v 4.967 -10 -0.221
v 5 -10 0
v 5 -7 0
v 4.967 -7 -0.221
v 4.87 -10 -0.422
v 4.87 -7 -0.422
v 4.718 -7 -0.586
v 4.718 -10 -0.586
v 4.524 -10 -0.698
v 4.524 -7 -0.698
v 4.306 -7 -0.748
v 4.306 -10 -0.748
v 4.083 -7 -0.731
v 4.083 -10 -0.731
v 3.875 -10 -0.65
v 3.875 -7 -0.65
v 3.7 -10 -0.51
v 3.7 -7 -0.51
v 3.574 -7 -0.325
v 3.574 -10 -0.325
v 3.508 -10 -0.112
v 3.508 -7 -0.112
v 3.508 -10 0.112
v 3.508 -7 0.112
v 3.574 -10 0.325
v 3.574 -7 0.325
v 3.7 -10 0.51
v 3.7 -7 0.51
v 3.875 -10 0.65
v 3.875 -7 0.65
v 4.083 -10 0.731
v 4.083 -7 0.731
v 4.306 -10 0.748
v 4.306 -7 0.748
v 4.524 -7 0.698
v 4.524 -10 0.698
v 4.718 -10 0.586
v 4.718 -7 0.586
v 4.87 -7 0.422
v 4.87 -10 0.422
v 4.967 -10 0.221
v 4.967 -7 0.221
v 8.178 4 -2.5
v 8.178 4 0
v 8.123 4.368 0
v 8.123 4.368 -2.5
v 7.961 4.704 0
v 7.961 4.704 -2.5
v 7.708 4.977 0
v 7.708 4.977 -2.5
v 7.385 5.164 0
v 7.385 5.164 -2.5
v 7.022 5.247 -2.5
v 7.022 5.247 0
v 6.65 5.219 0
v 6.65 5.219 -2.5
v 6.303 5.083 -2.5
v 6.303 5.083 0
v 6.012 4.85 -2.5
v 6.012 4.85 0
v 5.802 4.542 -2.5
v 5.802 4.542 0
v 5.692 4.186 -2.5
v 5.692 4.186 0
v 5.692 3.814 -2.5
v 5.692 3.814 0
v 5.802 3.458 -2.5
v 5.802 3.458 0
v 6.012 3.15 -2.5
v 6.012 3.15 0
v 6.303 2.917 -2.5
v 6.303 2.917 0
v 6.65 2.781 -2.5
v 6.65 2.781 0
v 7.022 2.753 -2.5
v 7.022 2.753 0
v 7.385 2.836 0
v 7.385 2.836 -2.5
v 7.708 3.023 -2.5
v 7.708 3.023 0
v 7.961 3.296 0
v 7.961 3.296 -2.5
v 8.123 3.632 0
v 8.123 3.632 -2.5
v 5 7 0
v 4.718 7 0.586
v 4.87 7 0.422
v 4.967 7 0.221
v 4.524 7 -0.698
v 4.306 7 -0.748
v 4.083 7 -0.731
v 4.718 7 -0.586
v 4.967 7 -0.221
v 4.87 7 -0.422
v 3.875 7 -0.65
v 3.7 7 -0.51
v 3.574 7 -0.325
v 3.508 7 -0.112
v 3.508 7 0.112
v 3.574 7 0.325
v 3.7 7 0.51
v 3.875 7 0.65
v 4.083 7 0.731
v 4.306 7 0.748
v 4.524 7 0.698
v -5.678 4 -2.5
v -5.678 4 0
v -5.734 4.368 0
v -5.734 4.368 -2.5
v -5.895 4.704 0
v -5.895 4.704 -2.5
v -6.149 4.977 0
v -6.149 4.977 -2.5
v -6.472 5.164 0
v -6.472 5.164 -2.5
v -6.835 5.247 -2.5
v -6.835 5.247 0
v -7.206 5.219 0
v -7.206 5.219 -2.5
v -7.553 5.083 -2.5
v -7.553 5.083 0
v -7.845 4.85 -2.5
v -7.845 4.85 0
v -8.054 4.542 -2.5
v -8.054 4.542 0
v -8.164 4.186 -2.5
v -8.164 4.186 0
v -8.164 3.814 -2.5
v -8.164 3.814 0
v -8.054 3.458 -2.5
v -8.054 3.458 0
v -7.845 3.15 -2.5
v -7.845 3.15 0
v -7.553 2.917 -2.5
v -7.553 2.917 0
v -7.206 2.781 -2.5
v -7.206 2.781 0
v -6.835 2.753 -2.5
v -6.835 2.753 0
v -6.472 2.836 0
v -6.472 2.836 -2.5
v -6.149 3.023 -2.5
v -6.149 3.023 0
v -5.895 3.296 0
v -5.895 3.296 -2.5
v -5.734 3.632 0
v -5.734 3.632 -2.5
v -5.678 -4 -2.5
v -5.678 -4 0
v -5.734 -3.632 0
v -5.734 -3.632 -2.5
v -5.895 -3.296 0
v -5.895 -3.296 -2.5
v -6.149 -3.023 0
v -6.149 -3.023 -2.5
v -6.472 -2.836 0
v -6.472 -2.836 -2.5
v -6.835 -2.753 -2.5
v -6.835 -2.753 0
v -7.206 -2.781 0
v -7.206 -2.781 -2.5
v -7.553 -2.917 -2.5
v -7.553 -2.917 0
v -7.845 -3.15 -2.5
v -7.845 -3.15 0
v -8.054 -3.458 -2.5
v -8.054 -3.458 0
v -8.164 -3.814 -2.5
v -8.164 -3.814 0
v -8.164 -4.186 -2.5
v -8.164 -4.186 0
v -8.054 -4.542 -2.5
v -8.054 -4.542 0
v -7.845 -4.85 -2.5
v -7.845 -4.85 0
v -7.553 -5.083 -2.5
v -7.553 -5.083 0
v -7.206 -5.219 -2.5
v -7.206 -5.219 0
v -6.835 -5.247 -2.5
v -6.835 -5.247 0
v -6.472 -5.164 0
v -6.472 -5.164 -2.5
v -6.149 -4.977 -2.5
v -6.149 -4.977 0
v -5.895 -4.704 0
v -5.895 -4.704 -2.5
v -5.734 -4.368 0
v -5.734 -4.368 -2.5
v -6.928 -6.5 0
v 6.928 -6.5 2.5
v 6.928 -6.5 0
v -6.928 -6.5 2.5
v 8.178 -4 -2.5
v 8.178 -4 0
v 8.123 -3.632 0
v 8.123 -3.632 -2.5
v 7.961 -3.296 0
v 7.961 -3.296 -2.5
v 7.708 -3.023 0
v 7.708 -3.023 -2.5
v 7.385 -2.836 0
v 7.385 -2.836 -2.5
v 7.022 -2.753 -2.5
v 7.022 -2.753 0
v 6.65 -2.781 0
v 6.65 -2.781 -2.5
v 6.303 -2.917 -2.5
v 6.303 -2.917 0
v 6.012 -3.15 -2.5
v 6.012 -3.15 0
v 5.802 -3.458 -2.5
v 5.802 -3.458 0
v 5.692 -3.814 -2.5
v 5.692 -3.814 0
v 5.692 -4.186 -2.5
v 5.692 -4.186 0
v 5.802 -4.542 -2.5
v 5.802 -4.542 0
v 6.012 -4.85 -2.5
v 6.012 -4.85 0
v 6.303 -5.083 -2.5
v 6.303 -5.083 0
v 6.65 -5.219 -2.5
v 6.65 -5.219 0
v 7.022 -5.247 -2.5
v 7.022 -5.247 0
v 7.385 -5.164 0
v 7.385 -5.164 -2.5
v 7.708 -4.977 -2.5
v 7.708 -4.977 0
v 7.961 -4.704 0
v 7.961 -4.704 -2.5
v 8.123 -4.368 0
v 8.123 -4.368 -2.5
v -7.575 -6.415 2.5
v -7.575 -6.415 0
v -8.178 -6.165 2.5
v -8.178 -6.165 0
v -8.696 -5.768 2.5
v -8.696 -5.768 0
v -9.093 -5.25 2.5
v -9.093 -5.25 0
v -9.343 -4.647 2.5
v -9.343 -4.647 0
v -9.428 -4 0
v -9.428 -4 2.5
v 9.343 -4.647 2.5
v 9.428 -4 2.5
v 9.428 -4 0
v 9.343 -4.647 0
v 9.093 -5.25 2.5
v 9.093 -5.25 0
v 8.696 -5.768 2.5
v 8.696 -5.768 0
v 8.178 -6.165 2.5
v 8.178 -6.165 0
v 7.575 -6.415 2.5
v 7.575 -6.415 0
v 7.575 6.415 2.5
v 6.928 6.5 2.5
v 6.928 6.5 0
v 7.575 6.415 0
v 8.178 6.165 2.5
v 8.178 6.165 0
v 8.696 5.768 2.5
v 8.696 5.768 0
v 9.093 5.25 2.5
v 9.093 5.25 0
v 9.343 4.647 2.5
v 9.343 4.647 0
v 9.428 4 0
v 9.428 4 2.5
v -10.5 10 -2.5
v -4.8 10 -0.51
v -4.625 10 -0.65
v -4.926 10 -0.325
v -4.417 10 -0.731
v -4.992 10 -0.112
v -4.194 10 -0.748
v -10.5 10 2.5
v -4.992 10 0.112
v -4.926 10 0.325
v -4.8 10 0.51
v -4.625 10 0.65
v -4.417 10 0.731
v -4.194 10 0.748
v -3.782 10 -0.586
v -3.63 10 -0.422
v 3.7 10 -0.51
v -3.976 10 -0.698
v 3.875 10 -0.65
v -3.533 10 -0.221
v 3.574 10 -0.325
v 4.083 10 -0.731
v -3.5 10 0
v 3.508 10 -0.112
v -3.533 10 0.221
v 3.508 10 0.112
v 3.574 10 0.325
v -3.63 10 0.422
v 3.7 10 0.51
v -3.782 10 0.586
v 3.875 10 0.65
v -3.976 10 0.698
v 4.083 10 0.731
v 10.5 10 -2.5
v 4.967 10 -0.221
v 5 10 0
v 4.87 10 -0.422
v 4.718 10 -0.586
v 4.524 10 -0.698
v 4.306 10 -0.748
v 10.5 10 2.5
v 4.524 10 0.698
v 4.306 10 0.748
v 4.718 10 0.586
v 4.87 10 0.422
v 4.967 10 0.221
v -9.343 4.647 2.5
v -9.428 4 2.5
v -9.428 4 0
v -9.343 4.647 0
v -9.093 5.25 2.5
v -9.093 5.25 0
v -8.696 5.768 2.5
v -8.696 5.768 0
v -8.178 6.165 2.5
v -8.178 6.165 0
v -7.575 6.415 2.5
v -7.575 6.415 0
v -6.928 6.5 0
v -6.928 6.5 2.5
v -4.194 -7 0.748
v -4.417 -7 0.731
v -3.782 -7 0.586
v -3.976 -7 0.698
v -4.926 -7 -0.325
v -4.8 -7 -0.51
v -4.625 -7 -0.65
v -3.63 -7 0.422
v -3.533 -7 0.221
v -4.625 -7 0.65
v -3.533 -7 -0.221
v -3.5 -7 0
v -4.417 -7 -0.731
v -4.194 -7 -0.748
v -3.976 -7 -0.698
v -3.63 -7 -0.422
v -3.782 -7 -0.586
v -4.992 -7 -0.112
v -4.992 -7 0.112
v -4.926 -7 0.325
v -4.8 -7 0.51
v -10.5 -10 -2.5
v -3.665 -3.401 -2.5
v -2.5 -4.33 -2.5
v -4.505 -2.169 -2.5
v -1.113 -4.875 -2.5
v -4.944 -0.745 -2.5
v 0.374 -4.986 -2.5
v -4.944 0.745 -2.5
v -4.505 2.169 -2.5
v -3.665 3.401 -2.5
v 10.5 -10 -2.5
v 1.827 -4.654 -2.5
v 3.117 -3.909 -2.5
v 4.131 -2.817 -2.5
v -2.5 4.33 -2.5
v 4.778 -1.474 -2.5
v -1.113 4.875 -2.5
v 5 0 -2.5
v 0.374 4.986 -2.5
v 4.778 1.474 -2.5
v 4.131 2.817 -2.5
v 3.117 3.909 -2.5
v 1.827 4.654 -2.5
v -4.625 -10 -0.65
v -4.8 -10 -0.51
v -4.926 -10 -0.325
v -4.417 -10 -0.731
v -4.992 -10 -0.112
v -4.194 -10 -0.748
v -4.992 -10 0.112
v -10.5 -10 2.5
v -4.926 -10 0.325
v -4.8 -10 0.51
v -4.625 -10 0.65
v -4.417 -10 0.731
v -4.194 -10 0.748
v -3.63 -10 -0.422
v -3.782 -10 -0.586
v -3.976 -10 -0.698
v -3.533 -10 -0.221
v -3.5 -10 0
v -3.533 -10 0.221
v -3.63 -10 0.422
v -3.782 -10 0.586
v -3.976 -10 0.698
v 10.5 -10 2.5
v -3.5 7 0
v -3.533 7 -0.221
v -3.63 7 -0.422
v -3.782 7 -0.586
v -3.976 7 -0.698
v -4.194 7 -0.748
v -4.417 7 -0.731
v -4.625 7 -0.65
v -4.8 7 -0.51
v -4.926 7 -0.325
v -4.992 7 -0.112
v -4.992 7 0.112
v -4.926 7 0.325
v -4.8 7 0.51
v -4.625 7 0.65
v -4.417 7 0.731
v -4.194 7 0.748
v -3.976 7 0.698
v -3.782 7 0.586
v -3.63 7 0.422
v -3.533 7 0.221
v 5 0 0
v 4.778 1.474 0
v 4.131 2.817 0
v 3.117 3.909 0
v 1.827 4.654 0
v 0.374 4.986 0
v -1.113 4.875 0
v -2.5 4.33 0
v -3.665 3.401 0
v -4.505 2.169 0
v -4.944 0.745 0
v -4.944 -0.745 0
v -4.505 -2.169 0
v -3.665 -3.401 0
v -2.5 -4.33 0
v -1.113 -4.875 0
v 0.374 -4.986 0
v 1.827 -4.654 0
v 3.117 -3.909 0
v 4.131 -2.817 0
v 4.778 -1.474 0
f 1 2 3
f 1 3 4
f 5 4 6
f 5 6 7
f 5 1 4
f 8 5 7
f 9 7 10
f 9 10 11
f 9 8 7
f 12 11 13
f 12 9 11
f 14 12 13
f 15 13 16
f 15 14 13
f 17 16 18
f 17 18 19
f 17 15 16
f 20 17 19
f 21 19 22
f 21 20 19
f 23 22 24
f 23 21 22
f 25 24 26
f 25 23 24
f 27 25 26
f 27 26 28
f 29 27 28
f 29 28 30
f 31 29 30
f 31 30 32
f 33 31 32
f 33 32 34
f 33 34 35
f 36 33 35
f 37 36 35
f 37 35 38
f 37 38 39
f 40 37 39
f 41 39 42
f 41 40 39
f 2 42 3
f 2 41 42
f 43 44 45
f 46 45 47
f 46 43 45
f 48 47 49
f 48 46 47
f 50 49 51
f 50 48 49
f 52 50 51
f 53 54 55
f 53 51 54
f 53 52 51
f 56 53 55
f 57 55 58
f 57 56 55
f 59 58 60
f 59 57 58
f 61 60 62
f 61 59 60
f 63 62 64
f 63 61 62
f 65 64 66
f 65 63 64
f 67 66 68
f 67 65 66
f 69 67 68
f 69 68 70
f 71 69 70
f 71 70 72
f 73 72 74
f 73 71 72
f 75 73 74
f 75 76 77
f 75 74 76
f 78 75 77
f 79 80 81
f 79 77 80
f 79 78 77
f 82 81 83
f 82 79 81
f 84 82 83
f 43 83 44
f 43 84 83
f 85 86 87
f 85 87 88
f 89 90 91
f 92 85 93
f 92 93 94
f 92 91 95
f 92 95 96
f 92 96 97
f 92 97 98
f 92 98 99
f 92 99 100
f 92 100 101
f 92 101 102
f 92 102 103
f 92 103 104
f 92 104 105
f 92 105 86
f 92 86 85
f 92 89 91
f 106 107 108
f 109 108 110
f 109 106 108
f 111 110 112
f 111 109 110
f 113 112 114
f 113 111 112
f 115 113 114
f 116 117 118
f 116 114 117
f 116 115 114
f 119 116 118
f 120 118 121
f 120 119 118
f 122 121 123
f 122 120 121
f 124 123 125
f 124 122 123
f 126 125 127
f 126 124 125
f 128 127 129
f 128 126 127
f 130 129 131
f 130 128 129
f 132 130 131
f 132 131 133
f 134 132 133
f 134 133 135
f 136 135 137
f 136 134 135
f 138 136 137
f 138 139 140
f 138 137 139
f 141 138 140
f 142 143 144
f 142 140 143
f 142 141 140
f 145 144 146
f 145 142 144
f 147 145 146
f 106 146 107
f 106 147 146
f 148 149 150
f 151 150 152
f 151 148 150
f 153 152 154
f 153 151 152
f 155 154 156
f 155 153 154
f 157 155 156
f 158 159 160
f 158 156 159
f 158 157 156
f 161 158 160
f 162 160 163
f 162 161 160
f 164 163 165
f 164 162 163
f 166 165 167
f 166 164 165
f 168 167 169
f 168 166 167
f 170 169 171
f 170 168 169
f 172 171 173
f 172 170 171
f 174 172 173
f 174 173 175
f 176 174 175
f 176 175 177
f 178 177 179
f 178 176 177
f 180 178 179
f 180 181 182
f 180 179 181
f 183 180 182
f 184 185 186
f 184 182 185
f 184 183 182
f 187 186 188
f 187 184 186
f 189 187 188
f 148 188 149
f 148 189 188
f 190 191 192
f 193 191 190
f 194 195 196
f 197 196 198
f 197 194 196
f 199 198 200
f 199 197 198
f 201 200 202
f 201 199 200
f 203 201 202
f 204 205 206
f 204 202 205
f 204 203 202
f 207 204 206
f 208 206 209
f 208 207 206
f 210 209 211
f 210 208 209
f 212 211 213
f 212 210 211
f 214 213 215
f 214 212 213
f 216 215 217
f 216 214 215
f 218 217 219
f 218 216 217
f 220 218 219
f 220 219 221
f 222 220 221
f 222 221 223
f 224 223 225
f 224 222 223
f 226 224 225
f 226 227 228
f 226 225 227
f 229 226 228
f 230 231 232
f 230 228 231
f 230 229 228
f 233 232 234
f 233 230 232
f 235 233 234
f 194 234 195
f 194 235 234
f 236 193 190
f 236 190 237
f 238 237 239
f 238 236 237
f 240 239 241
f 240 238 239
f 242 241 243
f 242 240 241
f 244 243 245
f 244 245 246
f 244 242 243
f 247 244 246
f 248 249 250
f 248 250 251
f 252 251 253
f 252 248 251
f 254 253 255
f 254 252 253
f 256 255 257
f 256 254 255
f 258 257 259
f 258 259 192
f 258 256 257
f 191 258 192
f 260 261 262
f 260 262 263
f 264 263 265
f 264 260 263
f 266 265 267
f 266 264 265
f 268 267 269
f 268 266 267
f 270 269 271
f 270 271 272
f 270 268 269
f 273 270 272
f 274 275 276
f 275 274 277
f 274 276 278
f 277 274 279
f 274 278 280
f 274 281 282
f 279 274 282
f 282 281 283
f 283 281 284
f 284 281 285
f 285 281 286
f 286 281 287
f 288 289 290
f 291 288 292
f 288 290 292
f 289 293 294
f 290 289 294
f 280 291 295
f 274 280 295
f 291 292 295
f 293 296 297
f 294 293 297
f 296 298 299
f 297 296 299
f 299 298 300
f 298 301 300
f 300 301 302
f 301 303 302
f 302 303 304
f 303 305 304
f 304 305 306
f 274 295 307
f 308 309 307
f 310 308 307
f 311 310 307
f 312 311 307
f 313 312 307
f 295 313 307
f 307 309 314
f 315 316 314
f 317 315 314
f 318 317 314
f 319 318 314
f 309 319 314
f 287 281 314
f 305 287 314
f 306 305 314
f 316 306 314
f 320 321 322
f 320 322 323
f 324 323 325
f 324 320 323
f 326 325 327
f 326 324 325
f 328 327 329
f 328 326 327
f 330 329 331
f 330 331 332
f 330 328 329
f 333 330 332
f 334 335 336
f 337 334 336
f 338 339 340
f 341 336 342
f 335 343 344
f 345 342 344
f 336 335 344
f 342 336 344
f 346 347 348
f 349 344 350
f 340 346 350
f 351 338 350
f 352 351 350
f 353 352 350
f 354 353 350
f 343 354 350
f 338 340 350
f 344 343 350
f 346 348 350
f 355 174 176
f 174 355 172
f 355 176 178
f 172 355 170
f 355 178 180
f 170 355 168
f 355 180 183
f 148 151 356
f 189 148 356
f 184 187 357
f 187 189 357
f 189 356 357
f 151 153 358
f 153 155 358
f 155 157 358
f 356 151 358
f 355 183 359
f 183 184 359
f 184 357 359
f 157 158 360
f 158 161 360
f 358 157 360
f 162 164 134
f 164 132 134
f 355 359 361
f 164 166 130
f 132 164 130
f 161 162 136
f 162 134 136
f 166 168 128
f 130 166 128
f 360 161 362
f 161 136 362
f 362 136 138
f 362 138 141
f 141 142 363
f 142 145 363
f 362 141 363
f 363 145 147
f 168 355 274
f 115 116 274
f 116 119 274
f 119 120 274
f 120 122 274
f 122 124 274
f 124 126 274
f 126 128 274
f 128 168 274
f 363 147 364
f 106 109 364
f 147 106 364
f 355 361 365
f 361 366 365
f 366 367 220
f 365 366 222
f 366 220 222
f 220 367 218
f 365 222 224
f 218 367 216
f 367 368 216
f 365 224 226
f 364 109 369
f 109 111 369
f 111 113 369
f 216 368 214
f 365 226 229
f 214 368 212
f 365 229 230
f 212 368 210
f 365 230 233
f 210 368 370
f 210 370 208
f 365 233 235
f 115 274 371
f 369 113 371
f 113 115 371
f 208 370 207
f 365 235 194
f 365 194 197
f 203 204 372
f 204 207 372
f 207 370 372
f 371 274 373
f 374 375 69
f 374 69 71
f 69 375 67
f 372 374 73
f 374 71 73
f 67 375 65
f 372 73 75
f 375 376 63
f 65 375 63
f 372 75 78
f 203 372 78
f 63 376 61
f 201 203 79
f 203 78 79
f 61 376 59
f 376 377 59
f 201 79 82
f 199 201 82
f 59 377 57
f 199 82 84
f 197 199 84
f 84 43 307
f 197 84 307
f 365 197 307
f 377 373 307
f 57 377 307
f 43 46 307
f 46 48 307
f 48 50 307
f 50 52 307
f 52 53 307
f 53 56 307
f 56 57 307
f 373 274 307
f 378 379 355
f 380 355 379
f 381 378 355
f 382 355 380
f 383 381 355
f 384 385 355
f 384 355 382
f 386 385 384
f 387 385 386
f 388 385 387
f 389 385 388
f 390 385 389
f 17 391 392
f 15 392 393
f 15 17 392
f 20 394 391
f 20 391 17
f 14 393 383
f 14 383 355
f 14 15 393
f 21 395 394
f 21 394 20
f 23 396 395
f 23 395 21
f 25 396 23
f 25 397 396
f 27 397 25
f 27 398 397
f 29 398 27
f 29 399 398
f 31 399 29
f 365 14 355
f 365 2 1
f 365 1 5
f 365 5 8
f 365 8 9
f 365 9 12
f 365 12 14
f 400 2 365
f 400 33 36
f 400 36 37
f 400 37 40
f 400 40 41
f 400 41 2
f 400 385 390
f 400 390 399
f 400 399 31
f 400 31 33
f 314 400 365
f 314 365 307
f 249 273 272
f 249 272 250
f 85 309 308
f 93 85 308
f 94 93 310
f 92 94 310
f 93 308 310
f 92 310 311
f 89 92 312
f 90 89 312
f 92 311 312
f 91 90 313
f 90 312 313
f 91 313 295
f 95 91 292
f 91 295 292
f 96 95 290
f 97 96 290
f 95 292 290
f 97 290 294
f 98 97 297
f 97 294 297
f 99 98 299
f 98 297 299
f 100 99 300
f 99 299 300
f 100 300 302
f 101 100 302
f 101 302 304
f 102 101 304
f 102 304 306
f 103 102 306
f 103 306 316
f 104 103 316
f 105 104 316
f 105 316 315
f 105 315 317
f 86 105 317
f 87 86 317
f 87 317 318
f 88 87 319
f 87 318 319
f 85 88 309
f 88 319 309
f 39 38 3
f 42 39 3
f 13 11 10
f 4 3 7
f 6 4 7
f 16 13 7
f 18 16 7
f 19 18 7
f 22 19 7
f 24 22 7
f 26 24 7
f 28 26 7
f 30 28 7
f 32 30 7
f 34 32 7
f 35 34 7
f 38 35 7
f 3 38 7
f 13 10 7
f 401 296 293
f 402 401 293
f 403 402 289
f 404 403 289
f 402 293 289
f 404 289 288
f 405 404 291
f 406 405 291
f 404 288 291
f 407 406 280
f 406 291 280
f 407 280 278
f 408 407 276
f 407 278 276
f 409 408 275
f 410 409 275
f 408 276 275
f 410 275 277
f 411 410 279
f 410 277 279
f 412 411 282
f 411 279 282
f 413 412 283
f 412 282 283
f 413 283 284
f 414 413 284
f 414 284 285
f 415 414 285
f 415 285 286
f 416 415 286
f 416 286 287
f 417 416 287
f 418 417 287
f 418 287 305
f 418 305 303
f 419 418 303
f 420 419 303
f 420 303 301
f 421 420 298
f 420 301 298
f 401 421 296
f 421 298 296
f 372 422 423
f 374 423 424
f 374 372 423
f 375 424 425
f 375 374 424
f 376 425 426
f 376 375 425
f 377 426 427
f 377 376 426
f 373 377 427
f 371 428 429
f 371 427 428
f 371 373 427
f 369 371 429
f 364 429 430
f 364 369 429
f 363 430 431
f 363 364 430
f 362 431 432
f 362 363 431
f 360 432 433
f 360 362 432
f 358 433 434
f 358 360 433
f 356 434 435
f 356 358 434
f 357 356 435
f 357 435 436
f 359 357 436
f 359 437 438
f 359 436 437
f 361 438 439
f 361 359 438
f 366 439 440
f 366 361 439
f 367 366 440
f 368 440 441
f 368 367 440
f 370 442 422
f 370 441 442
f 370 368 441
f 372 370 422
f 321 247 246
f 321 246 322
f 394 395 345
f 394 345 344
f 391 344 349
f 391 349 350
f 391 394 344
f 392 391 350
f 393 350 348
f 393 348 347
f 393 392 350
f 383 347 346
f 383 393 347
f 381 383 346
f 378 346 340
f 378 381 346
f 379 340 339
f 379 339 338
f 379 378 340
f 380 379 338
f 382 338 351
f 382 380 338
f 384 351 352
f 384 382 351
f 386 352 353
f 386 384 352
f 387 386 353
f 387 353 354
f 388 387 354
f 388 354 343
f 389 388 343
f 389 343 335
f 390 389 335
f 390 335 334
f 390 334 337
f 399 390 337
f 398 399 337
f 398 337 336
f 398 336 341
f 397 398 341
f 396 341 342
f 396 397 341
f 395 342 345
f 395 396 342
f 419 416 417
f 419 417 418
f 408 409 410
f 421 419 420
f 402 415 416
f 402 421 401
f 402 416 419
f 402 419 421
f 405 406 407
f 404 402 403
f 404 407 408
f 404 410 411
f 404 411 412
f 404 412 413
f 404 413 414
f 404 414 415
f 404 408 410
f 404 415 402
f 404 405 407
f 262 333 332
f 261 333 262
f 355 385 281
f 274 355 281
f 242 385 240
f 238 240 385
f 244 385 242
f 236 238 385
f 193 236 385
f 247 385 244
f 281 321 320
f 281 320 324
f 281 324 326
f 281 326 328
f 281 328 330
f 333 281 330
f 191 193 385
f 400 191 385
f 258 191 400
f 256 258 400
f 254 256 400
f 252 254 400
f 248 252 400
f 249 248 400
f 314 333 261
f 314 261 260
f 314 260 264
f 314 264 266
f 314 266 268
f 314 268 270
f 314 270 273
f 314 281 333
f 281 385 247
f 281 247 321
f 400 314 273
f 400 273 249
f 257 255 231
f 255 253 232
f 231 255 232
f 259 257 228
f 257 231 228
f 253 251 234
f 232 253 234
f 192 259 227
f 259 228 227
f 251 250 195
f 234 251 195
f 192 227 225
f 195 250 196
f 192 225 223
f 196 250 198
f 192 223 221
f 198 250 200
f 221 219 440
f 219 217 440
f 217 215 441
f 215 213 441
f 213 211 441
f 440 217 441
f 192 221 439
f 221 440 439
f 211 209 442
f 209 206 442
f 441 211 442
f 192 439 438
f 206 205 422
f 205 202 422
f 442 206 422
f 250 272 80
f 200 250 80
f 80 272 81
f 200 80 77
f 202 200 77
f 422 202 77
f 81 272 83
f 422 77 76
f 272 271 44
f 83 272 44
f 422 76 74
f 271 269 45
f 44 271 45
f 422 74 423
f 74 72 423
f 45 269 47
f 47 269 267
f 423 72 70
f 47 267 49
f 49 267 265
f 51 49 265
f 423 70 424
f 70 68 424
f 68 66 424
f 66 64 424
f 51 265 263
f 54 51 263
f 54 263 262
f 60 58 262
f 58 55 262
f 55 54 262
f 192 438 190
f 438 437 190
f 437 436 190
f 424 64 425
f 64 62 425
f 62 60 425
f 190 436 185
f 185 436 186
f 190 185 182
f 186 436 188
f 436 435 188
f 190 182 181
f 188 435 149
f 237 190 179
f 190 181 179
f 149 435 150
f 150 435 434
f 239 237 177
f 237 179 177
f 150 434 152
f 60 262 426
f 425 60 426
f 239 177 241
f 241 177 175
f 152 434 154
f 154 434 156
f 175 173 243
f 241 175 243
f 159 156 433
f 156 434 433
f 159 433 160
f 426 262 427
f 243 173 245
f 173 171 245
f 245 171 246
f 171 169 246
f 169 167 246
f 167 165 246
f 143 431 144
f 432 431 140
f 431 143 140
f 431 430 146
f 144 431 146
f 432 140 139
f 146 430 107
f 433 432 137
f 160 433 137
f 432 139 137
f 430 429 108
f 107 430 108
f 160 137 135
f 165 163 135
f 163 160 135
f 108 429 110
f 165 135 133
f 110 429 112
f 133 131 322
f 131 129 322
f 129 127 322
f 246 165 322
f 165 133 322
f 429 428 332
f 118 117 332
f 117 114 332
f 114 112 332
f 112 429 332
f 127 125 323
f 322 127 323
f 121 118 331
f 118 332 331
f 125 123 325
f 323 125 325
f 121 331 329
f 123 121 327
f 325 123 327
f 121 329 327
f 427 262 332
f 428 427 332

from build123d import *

# Parameters (mm, degrees)
SKIZZE1_W                       = 21
SKIZZE1_H                       = 20
SKIZZE1_R                       = 5
SKIZZE1_R_2                     = 1.25
AUFSATZ_LINEAR_AUSTRAGEN1_DEPTH = 2.5
SCHNITT_LINEAR_START            = 2.5
SCHNITT_LINEAR_AUSTRAGEN1_DEPTH = 2.5
SKIZZE4_R                       = 0.75
SCHNITT_LINEAR_AUSTRAGEN2_DEPTH = 3


with BuildPart() as part:
    # Skizze1 → Aufsatz-Linear austragen1 (new body, symmetric)
    with BuildSketch(Plane.XY):
        Rectangle(SKIZZE1_W, SKIZZE1_H)
        Circle(SKIZZE1_R, mode=Mode.SUBTRACT)
        with Locations((6.92820323, 4)):
            Circle(SKIZZE1_R_2, mode=Mode.SUBTRACT)
        with Locations((-6.92820323, -4)):
            Circle(SKIZZE1_R_2, mode=Mode.SUBTRACT)
        with Locations((-6.92820323, 4)):
            Circle(SKIZZE1_R_2, mode=Mode.SUBTRACT)
        with Locations((6.92820323, -4)):
            Circle(SKIZZE1_R_2, mode=Mode.SUBTRACT)
    extrude(amount=AUFSATZ_LINEAR_AUSTRAGEN1_DEPTH, both=True)

    # Skizze1<3> → Schnitt-Linear austragen1 (cut)
    with BuildSketch(Plane.XY.offset(SCHNITT_LINEAR_START)):
        with BuildLine():
            Line((-6.92820323, 6.5), (6.92820323, 6.5))
            ThreePointArc((6.92820323, 6.5), (8.695970183, 5.767766953), (9.42820323, 4))
            Line((9.42820323, 4), (9.42820323, -4))
            ThreePointArc((9.42820323, -4), (8.695970183, -5.767766953), (6.92820323, -6.5))
            Line((6.92820323, -6.5), (-6.92820323, -6.5))
            ThreePointArc((-6.92820323, -6.5), (-8.695970183, -5.767766953), (-9.42820323, -4))
            Line((-9.42820323, -4), (-9.42820323, 4))
            ThreePointArc((-9.42820323, 4), (-8.695970183, 5.767766953), (-6.92820323, 6.5))
        make_face()
    extrude(amount=-SCHNITT_LINEAR_AUSTRAGEN1_DEPTH, mode=Mode.SUBTRACT)

    # Skizze4 → Schnitt-Linear austragen2 (cut)
    with BuildSketch(Plane(origin=(0, 10, 0), x_dir=(1, 0, 0), z_dir=(0, 1, 0))):
        with Locations((-4.25, 0)):
            Circle(SKIZZE4_R)
        with Locations((4.25, 0)):
            Circle(SKIZZE4_R)
    schnitt_linear_austragen2 = extrude(amount=-SCHNITT_LINEAR_AUSTRAGEN2_DEPTH, mode=Mode.SUBTRACT)

    # Spiegeln1: Schnitt-Linear austragen2 across plane
    add(schnitt_linear_austragen2.mirror(Plane.ZX), mode=Mode.SUBTRACT)


solid = part.part
